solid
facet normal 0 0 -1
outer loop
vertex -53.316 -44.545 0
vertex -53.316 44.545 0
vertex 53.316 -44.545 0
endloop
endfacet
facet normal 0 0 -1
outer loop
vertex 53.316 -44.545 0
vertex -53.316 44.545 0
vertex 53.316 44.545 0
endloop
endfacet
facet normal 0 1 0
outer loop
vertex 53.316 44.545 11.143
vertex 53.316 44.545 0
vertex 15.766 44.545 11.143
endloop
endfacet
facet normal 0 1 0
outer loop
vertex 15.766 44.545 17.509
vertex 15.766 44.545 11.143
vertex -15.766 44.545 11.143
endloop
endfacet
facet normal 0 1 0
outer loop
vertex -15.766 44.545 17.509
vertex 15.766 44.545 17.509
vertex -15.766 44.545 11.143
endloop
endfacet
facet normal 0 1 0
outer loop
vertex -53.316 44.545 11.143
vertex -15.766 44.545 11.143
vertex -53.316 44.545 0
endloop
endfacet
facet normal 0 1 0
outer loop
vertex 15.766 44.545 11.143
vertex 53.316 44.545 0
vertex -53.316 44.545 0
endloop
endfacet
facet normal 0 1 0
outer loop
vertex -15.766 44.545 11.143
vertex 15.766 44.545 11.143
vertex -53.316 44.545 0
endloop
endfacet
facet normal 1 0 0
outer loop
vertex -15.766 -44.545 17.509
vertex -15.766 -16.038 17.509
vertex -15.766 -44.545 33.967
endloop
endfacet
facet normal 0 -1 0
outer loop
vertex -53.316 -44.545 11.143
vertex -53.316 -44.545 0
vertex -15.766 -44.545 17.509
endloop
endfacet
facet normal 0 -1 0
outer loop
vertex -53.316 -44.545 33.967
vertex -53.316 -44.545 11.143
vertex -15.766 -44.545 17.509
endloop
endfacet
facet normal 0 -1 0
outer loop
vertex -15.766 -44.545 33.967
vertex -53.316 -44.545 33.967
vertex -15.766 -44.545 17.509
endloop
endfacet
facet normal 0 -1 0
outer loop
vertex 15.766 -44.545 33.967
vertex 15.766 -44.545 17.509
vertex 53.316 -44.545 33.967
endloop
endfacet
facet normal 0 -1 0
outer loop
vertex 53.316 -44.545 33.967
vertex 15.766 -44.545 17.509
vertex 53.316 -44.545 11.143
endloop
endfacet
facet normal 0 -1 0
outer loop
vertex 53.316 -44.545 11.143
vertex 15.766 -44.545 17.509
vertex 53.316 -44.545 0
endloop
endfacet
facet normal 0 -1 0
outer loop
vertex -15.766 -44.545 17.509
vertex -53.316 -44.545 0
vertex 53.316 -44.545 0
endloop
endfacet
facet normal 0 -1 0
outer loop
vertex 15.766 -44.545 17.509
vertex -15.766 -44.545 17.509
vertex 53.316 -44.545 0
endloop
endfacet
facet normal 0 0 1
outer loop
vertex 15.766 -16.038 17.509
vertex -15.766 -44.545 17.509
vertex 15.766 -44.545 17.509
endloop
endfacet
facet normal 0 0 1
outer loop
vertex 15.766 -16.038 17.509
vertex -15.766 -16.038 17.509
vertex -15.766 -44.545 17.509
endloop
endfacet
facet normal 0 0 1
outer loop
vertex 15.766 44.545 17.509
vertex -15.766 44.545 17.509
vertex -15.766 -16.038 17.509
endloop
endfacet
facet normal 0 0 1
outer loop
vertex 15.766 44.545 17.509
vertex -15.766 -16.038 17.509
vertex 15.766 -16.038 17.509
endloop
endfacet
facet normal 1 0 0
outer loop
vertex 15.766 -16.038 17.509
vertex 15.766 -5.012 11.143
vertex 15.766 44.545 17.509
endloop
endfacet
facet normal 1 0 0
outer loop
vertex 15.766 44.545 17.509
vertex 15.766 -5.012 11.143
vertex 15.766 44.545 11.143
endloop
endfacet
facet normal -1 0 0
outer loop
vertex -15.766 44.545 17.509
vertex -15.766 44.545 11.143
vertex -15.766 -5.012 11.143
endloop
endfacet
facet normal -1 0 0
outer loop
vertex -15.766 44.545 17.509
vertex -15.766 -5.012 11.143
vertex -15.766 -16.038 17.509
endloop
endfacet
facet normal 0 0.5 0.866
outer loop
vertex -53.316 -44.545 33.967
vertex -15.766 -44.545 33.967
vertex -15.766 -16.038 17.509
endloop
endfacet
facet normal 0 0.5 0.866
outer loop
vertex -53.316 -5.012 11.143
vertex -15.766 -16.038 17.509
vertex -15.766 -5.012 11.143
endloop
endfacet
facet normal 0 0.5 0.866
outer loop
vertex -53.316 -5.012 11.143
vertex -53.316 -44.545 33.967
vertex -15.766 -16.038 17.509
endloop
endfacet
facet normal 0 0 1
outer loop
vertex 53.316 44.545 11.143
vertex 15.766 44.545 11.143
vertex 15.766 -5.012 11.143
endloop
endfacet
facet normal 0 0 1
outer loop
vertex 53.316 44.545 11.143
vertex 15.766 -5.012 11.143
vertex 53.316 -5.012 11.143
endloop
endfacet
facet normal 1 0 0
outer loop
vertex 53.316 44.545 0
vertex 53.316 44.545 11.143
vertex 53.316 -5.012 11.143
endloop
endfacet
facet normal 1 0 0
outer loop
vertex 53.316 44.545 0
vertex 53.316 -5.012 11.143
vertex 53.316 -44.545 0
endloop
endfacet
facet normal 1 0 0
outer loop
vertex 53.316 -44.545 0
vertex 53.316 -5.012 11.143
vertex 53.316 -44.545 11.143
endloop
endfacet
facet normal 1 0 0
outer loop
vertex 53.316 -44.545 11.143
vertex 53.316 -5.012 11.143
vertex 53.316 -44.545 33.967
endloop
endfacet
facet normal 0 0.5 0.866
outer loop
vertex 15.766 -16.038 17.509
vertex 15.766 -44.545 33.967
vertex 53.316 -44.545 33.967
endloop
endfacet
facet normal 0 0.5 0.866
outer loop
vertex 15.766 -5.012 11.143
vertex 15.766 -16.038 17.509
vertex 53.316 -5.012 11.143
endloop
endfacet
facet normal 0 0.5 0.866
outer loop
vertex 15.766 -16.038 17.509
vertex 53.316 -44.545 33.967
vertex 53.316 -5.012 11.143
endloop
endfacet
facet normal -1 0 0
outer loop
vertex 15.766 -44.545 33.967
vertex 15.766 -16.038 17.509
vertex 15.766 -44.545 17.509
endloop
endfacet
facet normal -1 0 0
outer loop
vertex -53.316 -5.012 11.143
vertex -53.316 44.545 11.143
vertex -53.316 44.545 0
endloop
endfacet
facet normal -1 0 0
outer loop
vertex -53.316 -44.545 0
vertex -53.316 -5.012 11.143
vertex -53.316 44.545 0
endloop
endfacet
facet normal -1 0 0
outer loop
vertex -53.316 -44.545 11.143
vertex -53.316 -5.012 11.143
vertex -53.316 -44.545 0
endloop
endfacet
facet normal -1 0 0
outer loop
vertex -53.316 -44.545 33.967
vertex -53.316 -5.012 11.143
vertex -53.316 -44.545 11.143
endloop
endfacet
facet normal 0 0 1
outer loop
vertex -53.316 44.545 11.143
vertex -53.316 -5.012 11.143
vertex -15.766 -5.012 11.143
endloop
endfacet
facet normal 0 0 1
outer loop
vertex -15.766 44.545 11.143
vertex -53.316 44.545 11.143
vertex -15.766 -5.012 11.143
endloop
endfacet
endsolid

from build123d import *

# Parameters (mm, degrees)
F0_W     = 106.6328883171
F0_H     = 89.0891589573
F1_DEPTH = 11.1428909004
F3_DEPTH = 37.5499762595
F6_DEPTH = 6.3658682629


with BuildPart() as f1:
    # F0 (on Top) → F1 (new body)
    with BuildSketch(Plane.XY):
        Rectangle(F0_W, F0_H)
    extrude(amount=F1_DEPTH)

    # F2 (on face) → F3 (join)
    with BuildSketch(Plane(origin=(-53.3164441586, 0, 0), x_dir=(0, -1, 0), z_dir=(-1, 0, 0))):
        Polygon((5.0119608641, 11.1428909004), (44.5445794787, 11.1428909004), (44.5445794787, 33.9670588993), align=None)
    extrude(amount=-F3_DEPTH)

    # F4: F1 across plane


with BuildPart() as f1_1:
    add(f1.part)
    add(f1.part.mirror(Plane.YZ))

    # F5 (on face) → F6 (join)
    with BuildSketch(Plane.XY.offset(11.1428909004)):
        Polygon((-15.7664678991, -5.0119608641), (-15.7664678991, -44.5445794787), (15.7664678991, -44.5445794787), (15.7664678991, -5.0119608641), (15.7664678991, 44.5445794787), (-15.7664678991, 44.5445794787), align=None)
    extrude(amount=F6_DEPTH)


solid = f1_1.part
